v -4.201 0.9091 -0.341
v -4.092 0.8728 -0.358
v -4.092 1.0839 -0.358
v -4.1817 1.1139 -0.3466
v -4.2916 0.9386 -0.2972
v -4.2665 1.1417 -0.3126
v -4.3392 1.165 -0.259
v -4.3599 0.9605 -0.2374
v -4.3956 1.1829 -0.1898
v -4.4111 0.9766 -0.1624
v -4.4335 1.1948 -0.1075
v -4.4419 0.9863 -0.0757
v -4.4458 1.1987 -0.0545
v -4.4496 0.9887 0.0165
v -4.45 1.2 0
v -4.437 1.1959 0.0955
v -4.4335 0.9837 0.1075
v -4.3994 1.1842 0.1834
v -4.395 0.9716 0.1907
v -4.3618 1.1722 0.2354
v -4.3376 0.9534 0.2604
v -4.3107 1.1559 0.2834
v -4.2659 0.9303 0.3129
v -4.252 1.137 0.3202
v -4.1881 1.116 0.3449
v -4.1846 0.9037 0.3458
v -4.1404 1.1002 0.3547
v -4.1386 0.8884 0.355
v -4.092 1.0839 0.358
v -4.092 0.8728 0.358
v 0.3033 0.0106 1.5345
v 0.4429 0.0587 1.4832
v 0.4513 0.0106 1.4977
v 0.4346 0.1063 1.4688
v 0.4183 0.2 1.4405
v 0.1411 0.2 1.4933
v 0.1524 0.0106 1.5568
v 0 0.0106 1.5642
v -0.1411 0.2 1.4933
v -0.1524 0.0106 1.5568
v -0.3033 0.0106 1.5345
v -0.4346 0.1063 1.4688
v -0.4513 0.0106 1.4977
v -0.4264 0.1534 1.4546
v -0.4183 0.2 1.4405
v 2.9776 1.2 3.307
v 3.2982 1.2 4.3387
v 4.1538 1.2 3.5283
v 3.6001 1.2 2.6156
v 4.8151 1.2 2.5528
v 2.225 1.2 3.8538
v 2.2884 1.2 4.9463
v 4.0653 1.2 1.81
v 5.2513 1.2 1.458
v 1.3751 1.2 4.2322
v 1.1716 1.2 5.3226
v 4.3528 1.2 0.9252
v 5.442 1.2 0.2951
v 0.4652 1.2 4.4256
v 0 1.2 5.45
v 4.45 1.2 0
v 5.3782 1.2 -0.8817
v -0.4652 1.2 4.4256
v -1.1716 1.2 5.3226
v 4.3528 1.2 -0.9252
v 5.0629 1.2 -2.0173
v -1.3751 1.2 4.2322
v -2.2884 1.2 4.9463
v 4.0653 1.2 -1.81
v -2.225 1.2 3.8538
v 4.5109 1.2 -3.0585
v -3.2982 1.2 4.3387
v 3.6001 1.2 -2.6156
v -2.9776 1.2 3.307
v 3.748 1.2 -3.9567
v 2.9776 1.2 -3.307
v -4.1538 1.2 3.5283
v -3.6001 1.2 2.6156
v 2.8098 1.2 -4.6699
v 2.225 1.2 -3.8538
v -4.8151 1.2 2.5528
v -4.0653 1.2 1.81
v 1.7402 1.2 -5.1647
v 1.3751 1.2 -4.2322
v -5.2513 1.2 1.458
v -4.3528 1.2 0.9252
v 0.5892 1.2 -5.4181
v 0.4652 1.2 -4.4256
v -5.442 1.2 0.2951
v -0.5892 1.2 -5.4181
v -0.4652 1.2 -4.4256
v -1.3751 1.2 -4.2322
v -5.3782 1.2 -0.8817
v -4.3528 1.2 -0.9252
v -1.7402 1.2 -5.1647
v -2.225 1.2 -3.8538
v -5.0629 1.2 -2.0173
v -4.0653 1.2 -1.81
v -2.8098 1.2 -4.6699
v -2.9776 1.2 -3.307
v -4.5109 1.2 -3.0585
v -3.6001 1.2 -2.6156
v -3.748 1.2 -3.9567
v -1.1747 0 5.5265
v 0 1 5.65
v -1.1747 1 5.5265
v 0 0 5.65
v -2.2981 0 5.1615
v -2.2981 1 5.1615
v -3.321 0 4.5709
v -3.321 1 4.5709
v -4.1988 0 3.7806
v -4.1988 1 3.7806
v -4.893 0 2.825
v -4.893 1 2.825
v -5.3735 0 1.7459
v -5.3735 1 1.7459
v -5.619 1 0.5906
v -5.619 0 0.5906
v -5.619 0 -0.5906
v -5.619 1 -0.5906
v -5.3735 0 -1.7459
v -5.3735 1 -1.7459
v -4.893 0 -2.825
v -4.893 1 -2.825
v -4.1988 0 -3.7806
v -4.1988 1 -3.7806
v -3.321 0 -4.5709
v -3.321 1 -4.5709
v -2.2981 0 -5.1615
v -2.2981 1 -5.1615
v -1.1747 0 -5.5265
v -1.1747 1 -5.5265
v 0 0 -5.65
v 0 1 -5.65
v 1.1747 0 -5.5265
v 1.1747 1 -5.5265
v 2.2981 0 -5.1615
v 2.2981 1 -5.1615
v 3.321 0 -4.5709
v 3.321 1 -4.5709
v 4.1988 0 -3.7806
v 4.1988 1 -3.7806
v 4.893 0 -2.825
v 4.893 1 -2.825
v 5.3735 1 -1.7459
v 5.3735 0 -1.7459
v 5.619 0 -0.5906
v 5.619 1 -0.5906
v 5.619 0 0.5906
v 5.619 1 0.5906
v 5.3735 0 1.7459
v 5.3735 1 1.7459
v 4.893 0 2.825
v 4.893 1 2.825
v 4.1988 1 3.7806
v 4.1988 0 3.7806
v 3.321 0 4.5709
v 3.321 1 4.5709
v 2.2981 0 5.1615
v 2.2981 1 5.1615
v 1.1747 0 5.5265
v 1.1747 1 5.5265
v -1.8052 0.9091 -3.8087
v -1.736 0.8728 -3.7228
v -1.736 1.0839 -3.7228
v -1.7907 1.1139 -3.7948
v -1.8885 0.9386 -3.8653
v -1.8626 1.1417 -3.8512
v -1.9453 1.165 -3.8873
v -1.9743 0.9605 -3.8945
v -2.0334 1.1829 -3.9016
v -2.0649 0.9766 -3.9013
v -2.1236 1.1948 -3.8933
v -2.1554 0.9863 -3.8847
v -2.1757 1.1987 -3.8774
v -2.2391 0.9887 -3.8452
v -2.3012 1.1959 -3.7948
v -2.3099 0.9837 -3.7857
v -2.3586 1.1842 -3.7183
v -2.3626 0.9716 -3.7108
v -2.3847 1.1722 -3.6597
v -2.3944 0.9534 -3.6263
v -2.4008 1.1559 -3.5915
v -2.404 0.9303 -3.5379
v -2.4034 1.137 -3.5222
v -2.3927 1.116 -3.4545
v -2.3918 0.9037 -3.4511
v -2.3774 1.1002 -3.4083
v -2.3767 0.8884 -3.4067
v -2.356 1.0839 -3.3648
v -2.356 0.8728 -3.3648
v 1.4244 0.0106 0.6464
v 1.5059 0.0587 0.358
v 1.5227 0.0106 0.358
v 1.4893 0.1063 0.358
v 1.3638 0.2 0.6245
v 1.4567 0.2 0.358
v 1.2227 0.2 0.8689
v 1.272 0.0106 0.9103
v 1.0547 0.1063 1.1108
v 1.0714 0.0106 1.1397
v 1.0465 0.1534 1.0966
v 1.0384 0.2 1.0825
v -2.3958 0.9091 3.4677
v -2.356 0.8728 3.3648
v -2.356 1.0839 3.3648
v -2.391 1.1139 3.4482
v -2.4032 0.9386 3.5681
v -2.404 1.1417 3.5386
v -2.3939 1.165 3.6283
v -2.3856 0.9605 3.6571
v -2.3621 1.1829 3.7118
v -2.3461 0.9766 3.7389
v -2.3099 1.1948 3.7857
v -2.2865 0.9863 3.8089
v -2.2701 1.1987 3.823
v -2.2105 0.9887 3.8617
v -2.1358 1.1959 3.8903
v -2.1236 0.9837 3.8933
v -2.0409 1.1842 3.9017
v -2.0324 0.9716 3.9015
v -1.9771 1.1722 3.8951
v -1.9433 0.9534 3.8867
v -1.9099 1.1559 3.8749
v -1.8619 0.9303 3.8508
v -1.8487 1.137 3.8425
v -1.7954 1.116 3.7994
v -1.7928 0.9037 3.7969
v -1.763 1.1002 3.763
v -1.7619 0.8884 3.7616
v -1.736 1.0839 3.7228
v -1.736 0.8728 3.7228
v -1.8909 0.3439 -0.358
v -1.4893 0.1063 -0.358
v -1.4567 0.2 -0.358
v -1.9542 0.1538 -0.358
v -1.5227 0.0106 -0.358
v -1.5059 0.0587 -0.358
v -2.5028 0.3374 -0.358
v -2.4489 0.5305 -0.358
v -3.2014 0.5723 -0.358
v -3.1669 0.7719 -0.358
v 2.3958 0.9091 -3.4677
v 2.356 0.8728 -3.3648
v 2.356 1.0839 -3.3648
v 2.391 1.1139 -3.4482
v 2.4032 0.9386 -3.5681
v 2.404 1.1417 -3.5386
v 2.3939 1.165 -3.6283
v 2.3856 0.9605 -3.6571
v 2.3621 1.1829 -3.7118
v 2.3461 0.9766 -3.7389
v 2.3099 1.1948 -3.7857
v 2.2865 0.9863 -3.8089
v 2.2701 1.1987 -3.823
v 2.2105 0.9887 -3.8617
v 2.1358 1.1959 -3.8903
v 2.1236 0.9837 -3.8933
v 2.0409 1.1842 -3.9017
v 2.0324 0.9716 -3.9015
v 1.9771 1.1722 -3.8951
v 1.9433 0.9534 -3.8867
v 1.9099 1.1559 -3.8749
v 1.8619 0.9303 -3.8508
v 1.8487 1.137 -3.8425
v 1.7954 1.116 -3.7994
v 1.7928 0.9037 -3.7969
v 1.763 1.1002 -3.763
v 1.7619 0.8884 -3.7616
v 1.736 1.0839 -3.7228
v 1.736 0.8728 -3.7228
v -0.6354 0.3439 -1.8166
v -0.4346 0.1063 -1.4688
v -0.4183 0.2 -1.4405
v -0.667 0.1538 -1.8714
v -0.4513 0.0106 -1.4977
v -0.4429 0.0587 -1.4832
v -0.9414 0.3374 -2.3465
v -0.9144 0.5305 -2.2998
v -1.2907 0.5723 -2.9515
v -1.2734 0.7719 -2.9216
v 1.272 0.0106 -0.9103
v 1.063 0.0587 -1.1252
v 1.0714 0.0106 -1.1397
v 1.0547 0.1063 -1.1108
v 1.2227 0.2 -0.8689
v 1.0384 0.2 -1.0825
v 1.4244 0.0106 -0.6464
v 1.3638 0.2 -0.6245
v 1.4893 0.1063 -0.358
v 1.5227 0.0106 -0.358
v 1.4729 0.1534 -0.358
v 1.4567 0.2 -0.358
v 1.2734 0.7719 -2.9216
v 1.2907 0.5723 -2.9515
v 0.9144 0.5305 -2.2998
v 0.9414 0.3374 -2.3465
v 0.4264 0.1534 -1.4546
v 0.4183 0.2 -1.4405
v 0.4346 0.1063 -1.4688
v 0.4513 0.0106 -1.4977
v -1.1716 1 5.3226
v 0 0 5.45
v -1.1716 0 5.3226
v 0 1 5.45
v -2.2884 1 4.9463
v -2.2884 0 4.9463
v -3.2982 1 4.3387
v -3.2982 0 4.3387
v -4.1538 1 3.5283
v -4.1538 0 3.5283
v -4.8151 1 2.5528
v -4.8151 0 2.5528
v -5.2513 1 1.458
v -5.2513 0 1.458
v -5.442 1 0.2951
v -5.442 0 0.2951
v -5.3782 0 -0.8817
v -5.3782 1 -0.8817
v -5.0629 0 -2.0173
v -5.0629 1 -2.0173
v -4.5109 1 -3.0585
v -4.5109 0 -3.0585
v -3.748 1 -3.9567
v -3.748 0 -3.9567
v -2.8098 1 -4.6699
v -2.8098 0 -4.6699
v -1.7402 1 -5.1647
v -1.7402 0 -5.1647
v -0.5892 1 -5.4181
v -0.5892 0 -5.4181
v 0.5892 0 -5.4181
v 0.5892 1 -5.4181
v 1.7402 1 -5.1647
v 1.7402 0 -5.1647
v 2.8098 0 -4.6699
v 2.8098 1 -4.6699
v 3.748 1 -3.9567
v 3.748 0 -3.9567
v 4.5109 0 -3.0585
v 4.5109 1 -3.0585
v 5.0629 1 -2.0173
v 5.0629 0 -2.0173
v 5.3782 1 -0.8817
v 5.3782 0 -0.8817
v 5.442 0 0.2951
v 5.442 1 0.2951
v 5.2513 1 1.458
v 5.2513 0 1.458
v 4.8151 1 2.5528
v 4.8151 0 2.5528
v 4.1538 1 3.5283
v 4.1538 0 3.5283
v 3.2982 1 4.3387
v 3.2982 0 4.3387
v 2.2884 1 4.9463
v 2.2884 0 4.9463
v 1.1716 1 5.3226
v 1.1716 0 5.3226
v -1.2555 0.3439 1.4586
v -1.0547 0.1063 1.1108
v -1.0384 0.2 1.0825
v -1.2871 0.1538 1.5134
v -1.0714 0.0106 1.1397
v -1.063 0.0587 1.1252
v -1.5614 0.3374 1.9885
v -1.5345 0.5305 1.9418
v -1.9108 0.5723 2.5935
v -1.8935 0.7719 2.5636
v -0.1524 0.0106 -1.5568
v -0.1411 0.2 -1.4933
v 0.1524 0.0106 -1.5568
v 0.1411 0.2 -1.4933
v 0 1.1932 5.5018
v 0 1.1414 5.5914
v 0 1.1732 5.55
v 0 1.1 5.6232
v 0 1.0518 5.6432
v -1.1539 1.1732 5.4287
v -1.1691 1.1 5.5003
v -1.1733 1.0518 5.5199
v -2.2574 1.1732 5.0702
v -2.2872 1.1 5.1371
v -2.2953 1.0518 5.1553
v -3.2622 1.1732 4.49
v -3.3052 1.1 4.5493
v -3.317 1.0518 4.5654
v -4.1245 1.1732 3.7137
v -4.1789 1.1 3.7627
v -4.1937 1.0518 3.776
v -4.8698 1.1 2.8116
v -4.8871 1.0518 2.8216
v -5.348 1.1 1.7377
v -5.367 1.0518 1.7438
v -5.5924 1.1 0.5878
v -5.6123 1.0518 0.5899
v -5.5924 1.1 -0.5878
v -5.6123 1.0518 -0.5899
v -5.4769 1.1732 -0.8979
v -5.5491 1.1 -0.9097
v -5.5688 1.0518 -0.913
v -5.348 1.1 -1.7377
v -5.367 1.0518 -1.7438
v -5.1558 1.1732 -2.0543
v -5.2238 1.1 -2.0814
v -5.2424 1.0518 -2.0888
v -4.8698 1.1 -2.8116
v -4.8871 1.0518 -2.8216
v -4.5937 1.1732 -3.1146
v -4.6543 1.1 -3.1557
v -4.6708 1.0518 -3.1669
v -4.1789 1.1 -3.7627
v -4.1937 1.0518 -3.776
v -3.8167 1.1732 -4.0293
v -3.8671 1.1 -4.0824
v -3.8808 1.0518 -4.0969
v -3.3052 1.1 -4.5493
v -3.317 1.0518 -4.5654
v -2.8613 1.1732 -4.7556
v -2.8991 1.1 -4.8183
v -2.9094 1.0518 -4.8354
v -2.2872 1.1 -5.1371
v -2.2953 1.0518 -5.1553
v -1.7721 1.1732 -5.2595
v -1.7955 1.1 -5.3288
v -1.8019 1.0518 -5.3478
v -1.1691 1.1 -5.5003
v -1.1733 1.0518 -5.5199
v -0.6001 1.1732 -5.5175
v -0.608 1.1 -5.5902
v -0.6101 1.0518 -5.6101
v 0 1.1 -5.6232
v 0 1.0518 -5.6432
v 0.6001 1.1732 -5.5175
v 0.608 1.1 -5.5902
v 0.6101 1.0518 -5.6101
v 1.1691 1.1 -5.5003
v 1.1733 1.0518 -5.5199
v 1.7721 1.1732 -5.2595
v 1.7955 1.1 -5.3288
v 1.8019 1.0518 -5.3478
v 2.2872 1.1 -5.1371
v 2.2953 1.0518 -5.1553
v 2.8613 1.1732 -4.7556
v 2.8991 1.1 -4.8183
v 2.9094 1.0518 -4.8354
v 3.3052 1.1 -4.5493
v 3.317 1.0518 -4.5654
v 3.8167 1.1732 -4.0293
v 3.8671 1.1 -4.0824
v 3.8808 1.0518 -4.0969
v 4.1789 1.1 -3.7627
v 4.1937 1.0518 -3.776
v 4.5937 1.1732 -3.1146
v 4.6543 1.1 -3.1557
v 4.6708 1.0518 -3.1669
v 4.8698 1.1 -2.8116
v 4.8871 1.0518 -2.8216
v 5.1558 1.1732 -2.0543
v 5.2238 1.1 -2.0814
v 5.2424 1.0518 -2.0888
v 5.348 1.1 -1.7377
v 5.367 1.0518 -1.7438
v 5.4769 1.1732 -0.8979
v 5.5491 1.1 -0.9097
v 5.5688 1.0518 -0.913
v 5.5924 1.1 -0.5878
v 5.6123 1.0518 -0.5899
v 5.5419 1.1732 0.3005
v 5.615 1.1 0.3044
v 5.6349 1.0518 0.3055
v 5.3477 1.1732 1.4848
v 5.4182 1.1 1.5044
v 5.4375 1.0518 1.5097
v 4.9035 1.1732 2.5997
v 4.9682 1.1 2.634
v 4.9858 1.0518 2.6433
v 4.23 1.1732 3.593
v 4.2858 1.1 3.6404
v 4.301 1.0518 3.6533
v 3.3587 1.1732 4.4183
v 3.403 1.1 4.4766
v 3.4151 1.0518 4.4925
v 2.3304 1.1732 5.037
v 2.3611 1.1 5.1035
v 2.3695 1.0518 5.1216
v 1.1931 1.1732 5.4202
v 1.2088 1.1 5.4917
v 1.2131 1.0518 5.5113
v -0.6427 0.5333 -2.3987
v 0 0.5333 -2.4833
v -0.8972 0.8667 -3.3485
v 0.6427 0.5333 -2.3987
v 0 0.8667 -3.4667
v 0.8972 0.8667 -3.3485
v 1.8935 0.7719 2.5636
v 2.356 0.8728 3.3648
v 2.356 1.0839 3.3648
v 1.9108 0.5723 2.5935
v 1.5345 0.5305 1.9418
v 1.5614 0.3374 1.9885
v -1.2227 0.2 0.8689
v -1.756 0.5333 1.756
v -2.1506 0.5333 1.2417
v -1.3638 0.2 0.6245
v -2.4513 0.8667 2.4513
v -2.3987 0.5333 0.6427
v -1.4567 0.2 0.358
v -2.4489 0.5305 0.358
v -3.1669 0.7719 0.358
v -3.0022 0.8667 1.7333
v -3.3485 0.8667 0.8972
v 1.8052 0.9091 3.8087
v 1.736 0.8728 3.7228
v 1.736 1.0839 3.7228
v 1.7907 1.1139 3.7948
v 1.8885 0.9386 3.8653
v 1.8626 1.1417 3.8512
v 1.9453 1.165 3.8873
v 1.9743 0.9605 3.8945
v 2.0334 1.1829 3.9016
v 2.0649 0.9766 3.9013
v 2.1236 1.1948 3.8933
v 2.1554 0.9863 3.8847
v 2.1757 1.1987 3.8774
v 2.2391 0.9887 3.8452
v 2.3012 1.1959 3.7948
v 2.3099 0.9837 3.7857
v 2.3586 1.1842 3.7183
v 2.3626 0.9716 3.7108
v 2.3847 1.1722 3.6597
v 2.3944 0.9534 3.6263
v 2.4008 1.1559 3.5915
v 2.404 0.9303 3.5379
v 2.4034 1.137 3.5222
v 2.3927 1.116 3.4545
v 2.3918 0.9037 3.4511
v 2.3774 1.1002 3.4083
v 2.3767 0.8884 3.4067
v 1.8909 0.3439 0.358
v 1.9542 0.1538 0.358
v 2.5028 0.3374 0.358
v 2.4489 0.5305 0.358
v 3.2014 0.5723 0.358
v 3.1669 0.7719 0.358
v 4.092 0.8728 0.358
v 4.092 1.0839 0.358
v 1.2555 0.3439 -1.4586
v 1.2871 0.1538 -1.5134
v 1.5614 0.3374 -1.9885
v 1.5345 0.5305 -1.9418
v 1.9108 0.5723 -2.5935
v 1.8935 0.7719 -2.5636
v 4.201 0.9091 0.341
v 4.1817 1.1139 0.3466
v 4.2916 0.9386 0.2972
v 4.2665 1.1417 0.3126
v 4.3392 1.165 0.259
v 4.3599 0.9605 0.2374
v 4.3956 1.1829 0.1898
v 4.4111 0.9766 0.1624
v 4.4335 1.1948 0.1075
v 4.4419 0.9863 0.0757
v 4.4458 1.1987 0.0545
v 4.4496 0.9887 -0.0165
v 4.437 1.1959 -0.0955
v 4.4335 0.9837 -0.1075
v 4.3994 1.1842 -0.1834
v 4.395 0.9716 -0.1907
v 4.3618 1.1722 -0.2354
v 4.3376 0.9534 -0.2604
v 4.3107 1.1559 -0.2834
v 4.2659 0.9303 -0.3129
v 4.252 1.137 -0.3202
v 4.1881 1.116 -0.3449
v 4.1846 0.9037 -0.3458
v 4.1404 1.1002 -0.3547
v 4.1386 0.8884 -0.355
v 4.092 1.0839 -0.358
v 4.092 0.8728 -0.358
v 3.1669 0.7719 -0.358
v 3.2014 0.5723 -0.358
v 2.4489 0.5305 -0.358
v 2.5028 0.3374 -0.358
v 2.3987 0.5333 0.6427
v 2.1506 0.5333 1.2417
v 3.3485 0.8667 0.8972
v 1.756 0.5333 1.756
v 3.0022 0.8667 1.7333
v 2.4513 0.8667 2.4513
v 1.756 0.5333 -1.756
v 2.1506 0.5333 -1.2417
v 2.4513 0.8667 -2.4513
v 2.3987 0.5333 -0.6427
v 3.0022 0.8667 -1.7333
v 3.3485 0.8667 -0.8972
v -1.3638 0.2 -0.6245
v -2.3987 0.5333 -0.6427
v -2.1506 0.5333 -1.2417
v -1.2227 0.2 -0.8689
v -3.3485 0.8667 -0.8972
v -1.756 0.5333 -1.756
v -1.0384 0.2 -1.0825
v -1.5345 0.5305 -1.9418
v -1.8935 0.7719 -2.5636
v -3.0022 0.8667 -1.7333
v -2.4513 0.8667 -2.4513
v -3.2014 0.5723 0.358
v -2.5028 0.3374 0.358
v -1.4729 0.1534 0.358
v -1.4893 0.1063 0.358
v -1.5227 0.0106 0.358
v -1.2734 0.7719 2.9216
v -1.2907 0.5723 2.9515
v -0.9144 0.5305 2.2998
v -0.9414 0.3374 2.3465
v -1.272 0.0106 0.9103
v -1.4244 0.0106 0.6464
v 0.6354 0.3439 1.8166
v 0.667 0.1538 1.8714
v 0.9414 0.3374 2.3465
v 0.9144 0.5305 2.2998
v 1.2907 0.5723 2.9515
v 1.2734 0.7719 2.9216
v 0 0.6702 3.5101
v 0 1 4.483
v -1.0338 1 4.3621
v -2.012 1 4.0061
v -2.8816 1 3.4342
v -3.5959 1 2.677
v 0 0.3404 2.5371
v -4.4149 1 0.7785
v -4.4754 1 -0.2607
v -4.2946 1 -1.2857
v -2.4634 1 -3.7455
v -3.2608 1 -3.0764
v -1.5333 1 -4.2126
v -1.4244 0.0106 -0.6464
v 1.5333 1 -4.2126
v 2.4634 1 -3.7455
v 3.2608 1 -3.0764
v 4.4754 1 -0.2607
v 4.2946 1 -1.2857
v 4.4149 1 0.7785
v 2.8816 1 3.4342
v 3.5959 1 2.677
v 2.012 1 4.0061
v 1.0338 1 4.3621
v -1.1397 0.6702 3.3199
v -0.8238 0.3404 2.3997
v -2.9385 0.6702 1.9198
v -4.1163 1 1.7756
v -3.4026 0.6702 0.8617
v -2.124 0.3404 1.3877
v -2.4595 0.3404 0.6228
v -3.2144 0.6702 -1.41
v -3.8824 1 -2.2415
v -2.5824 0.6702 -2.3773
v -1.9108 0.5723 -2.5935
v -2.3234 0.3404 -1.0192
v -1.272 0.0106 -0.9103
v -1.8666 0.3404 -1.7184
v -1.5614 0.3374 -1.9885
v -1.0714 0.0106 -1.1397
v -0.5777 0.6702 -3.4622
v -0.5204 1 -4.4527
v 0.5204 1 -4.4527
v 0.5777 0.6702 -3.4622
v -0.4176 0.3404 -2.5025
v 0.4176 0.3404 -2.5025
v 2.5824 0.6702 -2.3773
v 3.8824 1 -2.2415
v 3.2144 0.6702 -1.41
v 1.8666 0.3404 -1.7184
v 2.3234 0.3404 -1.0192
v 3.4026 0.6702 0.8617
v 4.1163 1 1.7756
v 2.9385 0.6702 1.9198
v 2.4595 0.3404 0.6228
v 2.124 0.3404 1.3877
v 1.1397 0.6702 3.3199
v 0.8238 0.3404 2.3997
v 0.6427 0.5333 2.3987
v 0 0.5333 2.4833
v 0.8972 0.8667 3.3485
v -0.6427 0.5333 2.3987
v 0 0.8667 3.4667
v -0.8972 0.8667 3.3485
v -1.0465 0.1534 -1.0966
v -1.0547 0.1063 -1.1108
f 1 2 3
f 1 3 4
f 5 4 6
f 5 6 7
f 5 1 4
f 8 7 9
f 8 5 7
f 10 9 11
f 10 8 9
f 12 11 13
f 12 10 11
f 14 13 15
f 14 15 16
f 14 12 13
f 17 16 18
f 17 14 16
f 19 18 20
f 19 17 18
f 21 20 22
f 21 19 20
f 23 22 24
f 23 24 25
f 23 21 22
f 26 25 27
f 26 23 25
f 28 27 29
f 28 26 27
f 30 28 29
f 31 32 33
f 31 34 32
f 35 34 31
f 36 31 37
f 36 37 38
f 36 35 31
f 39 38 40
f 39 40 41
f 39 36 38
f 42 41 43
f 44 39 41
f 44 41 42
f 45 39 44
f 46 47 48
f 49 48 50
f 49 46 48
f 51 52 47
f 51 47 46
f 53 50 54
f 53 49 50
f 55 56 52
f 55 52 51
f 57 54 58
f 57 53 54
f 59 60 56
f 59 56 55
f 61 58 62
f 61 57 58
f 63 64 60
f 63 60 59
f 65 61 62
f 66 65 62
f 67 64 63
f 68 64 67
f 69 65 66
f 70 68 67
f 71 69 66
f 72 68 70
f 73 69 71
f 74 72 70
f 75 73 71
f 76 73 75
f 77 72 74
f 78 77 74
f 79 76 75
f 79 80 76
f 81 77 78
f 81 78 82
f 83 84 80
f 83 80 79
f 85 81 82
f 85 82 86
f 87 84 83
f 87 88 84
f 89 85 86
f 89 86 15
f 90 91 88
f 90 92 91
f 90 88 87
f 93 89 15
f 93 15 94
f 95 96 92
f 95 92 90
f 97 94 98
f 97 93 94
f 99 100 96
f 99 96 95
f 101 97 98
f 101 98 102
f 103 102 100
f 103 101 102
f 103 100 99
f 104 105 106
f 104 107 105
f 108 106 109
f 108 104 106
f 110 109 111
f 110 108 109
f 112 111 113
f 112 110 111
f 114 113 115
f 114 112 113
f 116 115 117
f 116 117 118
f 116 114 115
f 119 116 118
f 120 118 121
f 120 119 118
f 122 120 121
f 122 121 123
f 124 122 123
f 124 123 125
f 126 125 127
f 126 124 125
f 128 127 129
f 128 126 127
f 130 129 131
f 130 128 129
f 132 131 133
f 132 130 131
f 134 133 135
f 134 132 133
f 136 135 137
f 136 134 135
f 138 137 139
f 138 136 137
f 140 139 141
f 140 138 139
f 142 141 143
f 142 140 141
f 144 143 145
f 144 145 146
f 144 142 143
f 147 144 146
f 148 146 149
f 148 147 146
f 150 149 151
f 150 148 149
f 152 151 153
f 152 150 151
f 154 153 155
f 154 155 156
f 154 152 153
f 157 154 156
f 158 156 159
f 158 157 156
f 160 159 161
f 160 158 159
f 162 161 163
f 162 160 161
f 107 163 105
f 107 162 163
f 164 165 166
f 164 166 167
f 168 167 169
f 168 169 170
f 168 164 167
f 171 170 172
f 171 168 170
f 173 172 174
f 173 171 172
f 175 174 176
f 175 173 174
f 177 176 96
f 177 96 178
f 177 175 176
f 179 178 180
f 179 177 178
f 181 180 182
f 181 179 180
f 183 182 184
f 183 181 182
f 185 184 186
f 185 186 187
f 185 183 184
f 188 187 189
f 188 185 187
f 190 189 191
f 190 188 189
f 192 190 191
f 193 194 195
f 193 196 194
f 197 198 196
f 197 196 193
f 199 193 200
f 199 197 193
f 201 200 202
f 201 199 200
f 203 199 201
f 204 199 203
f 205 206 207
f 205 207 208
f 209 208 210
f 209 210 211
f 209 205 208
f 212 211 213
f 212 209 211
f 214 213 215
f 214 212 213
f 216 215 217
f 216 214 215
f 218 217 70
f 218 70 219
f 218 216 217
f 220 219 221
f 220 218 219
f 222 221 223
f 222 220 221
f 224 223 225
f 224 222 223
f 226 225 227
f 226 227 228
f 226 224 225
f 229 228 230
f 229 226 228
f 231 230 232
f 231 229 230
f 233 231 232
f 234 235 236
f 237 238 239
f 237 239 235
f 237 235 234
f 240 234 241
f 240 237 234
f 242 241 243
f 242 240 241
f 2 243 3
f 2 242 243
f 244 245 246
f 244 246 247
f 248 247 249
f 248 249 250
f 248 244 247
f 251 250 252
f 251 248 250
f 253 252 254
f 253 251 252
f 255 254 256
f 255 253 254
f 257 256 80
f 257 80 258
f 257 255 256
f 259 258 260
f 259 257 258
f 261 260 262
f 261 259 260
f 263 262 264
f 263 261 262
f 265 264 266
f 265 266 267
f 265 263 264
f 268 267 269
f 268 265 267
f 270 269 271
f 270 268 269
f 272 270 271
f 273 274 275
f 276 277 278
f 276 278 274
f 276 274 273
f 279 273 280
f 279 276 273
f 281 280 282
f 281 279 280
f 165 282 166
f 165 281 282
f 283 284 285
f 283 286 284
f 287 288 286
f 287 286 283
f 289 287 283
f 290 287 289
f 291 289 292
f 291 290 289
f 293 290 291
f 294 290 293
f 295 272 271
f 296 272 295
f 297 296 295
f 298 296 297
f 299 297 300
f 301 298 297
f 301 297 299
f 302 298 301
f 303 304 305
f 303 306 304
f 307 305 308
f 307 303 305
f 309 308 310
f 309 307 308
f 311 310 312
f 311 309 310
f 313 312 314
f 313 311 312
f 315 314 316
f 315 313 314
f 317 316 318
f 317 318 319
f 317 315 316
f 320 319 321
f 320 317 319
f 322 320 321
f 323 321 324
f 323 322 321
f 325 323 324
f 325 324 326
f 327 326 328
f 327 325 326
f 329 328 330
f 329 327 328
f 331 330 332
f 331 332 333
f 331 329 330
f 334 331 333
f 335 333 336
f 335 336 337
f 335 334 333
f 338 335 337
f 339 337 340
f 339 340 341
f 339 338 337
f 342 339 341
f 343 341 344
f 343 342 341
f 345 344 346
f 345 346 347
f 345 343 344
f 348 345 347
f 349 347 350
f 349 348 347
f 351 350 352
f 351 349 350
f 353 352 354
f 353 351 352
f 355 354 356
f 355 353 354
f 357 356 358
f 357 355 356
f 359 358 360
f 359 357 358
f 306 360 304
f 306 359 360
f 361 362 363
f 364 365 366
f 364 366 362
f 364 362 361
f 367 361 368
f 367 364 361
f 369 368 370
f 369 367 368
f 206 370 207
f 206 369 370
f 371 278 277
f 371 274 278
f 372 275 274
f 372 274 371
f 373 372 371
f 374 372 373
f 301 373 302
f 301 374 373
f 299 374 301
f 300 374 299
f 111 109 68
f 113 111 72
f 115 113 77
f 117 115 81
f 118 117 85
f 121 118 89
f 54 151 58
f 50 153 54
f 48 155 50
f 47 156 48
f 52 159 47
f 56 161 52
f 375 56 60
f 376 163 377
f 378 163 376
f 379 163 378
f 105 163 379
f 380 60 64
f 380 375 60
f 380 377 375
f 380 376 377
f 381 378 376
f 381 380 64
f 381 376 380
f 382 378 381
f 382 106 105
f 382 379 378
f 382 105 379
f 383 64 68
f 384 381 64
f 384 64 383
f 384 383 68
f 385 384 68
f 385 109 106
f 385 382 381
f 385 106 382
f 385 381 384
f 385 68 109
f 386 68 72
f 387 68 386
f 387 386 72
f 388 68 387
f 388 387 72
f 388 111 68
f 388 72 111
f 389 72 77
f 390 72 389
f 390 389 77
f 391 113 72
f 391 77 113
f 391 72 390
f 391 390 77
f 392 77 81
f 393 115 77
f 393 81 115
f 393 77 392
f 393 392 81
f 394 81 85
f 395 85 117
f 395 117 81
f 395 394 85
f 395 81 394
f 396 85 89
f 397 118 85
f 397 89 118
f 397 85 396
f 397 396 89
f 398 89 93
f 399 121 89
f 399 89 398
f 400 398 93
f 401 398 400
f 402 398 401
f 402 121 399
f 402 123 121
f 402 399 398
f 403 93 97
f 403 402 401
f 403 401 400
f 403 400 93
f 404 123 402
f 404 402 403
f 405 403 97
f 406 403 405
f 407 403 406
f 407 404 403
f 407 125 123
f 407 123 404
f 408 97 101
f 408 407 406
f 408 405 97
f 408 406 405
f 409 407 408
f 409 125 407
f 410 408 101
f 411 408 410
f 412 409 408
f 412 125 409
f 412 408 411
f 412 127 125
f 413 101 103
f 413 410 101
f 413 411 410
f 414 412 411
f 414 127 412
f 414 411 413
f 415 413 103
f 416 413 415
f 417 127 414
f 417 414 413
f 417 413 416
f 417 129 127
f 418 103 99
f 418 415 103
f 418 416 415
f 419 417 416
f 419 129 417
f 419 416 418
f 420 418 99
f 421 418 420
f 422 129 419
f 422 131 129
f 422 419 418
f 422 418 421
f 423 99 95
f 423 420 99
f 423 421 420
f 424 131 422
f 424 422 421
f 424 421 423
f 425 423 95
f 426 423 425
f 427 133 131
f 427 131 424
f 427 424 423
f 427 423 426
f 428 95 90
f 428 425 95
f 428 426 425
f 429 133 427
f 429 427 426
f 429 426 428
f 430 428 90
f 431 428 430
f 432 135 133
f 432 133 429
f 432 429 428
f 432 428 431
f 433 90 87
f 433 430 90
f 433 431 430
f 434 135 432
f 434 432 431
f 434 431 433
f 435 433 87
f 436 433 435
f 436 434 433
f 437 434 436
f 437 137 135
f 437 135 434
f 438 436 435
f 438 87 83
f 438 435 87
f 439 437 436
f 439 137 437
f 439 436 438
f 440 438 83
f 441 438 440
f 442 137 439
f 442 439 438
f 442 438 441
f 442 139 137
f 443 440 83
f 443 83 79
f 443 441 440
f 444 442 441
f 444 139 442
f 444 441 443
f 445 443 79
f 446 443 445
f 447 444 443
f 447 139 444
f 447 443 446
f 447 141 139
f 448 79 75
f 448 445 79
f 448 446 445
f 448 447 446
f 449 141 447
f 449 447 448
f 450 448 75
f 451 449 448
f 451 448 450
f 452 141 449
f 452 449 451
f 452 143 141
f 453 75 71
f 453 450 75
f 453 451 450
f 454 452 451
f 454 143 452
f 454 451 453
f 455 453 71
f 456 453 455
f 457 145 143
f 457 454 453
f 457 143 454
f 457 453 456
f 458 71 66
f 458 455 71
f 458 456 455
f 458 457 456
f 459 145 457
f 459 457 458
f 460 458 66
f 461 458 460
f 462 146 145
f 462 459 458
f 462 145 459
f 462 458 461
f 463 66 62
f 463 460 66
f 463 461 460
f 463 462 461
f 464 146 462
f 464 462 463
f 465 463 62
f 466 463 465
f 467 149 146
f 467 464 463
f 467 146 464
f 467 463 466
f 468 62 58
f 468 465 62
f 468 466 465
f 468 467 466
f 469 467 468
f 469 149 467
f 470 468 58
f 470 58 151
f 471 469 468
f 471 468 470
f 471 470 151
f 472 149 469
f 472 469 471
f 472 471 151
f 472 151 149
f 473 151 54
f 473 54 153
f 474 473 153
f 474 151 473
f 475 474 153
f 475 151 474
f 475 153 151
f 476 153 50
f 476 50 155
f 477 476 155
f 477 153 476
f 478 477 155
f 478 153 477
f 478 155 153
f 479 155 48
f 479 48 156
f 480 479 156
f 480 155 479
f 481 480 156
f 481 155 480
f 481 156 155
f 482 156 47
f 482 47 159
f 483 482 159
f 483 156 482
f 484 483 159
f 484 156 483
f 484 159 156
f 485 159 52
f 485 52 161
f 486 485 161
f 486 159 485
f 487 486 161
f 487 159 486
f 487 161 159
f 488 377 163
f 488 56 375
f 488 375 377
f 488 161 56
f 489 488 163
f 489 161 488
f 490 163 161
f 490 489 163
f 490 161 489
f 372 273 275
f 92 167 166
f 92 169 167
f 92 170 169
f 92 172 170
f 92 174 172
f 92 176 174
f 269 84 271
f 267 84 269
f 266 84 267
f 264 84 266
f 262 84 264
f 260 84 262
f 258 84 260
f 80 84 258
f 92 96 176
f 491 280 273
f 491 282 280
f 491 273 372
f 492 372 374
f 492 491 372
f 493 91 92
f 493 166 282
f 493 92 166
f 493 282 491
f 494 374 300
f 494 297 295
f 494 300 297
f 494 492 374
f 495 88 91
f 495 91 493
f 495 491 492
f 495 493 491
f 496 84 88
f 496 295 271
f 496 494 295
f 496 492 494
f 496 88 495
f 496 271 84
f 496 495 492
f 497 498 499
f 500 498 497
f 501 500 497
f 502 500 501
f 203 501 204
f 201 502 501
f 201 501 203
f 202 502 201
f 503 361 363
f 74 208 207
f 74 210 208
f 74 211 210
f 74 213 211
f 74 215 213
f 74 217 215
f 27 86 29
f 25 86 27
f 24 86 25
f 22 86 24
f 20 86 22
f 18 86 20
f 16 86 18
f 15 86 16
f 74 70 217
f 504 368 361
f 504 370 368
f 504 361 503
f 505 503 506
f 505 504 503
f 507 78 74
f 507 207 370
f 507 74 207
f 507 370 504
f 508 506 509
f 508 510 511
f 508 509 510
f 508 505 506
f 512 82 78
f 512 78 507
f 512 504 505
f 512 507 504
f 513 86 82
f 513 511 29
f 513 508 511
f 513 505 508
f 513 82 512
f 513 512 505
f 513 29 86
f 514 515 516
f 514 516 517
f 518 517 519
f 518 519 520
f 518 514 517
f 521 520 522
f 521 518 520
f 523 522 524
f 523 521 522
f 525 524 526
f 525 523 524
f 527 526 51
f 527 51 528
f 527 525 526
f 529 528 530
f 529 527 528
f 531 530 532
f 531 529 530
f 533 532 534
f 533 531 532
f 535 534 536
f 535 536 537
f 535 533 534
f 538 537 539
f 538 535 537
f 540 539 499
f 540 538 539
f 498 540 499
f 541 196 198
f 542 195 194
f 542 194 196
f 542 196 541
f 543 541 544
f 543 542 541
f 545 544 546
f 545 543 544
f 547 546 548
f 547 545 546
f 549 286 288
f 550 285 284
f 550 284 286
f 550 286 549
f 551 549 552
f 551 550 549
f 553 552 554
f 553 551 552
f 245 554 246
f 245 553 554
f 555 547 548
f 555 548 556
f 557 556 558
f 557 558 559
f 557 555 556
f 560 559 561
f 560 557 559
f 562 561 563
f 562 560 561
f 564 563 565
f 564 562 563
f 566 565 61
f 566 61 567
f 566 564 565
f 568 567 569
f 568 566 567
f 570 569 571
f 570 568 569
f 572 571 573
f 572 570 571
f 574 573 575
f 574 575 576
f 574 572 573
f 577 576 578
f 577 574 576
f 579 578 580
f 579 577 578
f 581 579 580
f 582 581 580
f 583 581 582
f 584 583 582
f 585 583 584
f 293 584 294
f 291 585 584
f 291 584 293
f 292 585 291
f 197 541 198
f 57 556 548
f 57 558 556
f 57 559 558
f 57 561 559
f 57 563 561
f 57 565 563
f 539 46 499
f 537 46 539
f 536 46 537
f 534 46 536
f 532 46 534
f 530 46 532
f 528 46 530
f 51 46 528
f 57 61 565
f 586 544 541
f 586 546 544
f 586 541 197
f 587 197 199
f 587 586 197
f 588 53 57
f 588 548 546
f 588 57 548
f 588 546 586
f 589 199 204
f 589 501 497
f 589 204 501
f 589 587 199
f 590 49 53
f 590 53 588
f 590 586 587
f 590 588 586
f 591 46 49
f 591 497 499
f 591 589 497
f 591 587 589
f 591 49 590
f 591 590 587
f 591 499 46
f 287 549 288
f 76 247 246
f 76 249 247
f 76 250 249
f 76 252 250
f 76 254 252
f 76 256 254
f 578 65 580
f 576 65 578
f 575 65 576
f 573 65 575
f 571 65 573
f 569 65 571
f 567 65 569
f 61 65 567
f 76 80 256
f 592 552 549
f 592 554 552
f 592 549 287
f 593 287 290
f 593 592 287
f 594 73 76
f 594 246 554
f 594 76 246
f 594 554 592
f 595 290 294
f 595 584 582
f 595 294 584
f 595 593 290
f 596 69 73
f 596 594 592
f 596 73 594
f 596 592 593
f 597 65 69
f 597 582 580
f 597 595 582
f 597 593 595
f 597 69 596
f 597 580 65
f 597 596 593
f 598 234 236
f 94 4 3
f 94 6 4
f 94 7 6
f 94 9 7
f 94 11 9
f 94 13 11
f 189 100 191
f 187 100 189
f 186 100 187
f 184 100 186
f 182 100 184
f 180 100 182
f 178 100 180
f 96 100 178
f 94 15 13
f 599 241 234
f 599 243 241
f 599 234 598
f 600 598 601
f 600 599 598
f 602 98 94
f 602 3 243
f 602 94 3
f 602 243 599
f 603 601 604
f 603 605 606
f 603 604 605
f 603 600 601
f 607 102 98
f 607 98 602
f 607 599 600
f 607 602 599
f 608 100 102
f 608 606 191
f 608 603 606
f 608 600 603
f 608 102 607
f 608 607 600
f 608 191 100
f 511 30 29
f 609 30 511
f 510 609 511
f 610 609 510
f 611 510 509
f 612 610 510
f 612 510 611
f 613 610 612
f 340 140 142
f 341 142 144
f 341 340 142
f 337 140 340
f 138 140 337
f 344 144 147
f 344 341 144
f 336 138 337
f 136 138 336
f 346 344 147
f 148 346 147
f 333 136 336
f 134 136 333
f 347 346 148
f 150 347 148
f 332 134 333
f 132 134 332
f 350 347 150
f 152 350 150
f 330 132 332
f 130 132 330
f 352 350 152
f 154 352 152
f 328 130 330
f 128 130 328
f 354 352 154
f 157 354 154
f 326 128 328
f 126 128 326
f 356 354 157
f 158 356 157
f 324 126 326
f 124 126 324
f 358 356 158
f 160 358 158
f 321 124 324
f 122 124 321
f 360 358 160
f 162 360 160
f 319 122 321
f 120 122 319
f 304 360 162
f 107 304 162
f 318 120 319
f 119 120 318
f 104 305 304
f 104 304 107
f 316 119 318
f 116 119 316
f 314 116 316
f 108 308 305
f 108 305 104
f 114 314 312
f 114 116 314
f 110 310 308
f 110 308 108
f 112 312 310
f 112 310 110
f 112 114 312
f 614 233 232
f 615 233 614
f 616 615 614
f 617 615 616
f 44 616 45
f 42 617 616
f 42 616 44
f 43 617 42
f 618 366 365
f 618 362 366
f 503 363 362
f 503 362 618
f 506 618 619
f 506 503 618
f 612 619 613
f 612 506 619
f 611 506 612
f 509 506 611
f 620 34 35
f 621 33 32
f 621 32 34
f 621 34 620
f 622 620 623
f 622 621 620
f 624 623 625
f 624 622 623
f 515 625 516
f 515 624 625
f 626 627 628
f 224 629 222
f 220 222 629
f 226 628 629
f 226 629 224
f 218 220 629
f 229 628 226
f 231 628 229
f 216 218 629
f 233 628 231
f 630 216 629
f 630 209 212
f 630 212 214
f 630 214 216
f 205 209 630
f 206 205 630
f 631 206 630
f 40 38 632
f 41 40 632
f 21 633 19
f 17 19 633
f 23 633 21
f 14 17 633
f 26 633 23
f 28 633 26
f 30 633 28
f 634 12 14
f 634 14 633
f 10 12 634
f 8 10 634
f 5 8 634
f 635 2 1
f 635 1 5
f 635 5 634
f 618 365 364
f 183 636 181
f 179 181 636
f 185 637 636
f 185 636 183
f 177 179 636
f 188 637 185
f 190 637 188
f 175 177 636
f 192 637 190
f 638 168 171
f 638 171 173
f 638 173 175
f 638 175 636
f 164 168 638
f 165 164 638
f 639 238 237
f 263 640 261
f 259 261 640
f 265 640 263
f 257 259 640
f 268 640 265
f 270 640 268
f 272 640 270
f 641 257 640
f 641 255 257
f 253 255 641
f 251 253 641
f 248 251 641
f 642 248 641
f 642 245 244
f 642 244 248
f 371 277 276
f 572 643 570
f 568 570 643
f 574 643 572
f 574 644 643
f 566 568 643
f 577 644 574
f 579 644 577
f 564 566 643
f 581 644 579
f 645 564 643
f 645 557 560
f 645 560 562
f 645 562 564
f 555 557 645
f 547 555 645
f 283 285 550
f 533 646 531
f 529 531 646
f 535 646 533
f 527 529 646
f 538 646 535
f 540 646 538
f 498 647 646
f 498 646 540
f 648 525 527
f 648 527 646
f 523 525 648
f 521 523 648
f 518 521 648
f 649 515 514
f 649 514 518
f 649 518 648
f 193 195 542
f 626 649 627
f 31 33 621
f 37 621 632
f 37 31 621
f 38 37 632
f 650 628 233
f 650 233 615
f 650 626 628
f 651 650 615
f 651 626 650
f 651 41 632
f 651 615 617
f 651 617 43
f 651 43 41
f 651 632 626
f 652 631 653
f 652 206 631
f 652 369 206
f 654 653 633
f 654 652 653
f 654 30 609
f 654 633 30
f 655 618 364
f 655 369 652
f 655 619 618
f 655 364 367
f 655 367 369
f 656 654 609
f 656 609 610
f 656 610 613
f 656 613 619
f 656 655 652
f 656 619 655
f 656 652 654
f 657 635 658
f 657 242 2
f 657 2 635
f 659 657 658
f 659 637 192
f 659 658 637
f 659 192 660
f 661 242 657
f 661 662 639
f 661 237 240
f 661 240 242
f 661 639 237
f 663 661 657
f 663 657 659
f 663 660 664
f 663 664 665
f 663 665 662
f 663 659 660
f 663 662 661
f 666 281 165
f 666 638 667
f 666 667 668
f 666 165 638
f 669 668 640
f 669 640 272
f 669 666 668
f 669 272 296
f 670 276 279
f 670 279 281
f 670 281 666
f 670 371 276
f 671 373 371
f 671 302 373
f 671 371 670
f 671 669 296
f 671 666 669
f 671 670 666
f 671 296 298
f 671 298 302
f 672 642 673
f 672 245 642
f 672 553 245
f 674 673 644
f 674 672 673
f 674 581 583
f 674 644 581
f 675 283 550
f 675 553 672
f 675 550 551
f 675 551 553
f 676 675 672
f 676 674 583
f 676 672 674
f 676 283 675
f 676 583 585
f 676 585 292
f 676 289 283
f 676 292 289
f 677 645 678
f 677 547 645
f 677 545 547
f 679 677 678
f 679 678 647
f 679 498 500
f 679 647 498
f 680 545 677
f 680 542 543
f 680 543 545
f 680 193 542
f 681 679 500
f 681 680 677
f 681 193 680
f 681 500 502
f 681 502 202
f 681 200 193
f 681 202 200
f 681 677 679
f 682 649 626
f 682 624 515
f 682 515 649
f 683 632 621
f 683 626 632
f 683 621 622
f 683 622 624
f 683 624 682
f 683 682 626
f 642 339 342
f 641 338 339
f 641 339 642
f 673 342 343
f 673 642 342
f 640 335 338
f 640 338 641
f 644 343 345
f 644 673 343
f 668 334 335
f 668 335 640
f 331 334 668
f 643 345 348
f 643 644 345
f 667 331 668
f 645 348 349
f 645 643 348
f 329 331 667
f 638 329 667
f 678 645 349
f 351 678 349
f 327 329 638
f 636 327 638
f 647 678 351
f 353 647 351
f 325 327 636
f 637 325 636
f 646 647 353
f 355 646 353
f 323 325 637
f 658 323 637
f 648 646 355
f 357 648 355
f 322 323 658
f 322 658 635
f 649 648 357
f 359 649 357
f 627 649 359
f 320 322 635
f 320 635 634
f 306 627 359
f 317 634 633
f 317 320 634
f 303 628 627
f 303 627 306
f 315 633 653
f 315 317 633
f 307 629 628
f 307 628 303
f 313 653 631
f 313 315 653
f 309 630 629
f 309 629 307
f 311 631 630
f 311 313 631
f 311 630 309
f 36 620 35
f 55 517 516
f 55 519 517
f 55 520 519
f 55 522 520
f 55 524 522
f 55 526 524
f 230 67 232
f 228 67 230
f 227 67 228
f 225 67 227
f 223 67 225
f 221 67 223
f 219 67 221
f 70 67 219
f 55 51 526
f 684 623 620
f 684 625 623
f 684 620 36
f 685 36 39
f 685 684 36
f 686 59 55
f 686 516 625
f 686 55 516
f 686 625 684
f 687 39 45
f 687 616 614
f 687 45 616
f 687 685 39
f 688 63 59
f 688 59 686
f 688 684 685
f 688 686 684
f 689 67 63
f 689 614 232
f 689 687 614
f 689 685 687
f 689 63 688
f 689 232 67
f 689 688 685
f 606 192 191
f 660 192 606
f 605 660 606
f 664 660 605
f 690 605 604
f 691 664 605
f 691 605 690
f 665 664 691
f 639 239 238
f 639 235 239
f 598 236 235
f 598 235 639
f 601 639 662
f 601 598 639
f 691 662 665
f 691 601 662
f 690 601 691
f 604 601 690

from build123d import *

# Parameters (mm, degrees)
CUT_SLIT_DEPTH         = 9.079913366
PATTERN_CUT_SLIT_COUNT = 6


with BuildPart() as part:
    # Sketch4 → Body-Washer (revolve)
    with BuildSketch(Plane.XY, mode=Mode.PRIVATE) as body_washer_sk:
        with BuildLine():
            Line((1.5, 0.2), (4.45, 1.2))
            Line((4.45, 1.2), (5.45, 1.2))
            ThreePointArc((5.45, 1.2), (5.591421356, 1.141421356), (5.65, 1))
            Line((5.65, 1), (5.65, 0))
            Line((5.65, 0), (5.45, 0))
            Line((5.45, 0), (5.45, 1))
            Line((5.45, 1), (4.482976725, 1))
            Line((4.482976725, 1), (1.564207856, 0.010586824))
            Line((1.564207856, 0.010586824), (1.5, 0.2))
        make_face()
    revolve(body_washer_sk.sketch.rotate(Axis((0, 1.2, 0), (0, -1, 0)), 90), axis=Axis((0, 1.2, 0), (0, -1, 0)))

    # Sketch5 → Cut-Slit (cut, through all)
    with BuildSketch(Plane(origin=(0, 0, 0), x_dir=(1, 0, 0), z_dir=(0, 1, 0))):
        with BuildLine():
            Line((4.091996679, 0.358003321), (1.45665151, 0.358003321))
            ThreePointArc((1.45665151, 0.358003321), (1.5, 0), (1.45665151, -0.358003321))
            Line((1.45665151, -0.358003321), (4.091996679, -0.358003321))
            ThreePointArc((4.091996679, -0.358003321), (4.45, 0), (4.091996679, 0.358003321))
        make_face()
    cut_slit = extrude(amount=CUT_SLIT_DEPTH, mode=Mode.SUBTRACT)

    # Pattern-Cut-Slit: Cut-Slit ×6 about axis
    pattern_cut_slit_axis = Axis((0, 0, 0), (0, 1, 0))
    for i in range(1, PATTERN_CUT_SLIT_COUNT):
        add(cut_slit.rotate(pattern_cut_slit_axis, i * 360 / PATTERN_CUT_SLIT_COUNT), mode=Mode.SUBTRACT)


solid = part.part
